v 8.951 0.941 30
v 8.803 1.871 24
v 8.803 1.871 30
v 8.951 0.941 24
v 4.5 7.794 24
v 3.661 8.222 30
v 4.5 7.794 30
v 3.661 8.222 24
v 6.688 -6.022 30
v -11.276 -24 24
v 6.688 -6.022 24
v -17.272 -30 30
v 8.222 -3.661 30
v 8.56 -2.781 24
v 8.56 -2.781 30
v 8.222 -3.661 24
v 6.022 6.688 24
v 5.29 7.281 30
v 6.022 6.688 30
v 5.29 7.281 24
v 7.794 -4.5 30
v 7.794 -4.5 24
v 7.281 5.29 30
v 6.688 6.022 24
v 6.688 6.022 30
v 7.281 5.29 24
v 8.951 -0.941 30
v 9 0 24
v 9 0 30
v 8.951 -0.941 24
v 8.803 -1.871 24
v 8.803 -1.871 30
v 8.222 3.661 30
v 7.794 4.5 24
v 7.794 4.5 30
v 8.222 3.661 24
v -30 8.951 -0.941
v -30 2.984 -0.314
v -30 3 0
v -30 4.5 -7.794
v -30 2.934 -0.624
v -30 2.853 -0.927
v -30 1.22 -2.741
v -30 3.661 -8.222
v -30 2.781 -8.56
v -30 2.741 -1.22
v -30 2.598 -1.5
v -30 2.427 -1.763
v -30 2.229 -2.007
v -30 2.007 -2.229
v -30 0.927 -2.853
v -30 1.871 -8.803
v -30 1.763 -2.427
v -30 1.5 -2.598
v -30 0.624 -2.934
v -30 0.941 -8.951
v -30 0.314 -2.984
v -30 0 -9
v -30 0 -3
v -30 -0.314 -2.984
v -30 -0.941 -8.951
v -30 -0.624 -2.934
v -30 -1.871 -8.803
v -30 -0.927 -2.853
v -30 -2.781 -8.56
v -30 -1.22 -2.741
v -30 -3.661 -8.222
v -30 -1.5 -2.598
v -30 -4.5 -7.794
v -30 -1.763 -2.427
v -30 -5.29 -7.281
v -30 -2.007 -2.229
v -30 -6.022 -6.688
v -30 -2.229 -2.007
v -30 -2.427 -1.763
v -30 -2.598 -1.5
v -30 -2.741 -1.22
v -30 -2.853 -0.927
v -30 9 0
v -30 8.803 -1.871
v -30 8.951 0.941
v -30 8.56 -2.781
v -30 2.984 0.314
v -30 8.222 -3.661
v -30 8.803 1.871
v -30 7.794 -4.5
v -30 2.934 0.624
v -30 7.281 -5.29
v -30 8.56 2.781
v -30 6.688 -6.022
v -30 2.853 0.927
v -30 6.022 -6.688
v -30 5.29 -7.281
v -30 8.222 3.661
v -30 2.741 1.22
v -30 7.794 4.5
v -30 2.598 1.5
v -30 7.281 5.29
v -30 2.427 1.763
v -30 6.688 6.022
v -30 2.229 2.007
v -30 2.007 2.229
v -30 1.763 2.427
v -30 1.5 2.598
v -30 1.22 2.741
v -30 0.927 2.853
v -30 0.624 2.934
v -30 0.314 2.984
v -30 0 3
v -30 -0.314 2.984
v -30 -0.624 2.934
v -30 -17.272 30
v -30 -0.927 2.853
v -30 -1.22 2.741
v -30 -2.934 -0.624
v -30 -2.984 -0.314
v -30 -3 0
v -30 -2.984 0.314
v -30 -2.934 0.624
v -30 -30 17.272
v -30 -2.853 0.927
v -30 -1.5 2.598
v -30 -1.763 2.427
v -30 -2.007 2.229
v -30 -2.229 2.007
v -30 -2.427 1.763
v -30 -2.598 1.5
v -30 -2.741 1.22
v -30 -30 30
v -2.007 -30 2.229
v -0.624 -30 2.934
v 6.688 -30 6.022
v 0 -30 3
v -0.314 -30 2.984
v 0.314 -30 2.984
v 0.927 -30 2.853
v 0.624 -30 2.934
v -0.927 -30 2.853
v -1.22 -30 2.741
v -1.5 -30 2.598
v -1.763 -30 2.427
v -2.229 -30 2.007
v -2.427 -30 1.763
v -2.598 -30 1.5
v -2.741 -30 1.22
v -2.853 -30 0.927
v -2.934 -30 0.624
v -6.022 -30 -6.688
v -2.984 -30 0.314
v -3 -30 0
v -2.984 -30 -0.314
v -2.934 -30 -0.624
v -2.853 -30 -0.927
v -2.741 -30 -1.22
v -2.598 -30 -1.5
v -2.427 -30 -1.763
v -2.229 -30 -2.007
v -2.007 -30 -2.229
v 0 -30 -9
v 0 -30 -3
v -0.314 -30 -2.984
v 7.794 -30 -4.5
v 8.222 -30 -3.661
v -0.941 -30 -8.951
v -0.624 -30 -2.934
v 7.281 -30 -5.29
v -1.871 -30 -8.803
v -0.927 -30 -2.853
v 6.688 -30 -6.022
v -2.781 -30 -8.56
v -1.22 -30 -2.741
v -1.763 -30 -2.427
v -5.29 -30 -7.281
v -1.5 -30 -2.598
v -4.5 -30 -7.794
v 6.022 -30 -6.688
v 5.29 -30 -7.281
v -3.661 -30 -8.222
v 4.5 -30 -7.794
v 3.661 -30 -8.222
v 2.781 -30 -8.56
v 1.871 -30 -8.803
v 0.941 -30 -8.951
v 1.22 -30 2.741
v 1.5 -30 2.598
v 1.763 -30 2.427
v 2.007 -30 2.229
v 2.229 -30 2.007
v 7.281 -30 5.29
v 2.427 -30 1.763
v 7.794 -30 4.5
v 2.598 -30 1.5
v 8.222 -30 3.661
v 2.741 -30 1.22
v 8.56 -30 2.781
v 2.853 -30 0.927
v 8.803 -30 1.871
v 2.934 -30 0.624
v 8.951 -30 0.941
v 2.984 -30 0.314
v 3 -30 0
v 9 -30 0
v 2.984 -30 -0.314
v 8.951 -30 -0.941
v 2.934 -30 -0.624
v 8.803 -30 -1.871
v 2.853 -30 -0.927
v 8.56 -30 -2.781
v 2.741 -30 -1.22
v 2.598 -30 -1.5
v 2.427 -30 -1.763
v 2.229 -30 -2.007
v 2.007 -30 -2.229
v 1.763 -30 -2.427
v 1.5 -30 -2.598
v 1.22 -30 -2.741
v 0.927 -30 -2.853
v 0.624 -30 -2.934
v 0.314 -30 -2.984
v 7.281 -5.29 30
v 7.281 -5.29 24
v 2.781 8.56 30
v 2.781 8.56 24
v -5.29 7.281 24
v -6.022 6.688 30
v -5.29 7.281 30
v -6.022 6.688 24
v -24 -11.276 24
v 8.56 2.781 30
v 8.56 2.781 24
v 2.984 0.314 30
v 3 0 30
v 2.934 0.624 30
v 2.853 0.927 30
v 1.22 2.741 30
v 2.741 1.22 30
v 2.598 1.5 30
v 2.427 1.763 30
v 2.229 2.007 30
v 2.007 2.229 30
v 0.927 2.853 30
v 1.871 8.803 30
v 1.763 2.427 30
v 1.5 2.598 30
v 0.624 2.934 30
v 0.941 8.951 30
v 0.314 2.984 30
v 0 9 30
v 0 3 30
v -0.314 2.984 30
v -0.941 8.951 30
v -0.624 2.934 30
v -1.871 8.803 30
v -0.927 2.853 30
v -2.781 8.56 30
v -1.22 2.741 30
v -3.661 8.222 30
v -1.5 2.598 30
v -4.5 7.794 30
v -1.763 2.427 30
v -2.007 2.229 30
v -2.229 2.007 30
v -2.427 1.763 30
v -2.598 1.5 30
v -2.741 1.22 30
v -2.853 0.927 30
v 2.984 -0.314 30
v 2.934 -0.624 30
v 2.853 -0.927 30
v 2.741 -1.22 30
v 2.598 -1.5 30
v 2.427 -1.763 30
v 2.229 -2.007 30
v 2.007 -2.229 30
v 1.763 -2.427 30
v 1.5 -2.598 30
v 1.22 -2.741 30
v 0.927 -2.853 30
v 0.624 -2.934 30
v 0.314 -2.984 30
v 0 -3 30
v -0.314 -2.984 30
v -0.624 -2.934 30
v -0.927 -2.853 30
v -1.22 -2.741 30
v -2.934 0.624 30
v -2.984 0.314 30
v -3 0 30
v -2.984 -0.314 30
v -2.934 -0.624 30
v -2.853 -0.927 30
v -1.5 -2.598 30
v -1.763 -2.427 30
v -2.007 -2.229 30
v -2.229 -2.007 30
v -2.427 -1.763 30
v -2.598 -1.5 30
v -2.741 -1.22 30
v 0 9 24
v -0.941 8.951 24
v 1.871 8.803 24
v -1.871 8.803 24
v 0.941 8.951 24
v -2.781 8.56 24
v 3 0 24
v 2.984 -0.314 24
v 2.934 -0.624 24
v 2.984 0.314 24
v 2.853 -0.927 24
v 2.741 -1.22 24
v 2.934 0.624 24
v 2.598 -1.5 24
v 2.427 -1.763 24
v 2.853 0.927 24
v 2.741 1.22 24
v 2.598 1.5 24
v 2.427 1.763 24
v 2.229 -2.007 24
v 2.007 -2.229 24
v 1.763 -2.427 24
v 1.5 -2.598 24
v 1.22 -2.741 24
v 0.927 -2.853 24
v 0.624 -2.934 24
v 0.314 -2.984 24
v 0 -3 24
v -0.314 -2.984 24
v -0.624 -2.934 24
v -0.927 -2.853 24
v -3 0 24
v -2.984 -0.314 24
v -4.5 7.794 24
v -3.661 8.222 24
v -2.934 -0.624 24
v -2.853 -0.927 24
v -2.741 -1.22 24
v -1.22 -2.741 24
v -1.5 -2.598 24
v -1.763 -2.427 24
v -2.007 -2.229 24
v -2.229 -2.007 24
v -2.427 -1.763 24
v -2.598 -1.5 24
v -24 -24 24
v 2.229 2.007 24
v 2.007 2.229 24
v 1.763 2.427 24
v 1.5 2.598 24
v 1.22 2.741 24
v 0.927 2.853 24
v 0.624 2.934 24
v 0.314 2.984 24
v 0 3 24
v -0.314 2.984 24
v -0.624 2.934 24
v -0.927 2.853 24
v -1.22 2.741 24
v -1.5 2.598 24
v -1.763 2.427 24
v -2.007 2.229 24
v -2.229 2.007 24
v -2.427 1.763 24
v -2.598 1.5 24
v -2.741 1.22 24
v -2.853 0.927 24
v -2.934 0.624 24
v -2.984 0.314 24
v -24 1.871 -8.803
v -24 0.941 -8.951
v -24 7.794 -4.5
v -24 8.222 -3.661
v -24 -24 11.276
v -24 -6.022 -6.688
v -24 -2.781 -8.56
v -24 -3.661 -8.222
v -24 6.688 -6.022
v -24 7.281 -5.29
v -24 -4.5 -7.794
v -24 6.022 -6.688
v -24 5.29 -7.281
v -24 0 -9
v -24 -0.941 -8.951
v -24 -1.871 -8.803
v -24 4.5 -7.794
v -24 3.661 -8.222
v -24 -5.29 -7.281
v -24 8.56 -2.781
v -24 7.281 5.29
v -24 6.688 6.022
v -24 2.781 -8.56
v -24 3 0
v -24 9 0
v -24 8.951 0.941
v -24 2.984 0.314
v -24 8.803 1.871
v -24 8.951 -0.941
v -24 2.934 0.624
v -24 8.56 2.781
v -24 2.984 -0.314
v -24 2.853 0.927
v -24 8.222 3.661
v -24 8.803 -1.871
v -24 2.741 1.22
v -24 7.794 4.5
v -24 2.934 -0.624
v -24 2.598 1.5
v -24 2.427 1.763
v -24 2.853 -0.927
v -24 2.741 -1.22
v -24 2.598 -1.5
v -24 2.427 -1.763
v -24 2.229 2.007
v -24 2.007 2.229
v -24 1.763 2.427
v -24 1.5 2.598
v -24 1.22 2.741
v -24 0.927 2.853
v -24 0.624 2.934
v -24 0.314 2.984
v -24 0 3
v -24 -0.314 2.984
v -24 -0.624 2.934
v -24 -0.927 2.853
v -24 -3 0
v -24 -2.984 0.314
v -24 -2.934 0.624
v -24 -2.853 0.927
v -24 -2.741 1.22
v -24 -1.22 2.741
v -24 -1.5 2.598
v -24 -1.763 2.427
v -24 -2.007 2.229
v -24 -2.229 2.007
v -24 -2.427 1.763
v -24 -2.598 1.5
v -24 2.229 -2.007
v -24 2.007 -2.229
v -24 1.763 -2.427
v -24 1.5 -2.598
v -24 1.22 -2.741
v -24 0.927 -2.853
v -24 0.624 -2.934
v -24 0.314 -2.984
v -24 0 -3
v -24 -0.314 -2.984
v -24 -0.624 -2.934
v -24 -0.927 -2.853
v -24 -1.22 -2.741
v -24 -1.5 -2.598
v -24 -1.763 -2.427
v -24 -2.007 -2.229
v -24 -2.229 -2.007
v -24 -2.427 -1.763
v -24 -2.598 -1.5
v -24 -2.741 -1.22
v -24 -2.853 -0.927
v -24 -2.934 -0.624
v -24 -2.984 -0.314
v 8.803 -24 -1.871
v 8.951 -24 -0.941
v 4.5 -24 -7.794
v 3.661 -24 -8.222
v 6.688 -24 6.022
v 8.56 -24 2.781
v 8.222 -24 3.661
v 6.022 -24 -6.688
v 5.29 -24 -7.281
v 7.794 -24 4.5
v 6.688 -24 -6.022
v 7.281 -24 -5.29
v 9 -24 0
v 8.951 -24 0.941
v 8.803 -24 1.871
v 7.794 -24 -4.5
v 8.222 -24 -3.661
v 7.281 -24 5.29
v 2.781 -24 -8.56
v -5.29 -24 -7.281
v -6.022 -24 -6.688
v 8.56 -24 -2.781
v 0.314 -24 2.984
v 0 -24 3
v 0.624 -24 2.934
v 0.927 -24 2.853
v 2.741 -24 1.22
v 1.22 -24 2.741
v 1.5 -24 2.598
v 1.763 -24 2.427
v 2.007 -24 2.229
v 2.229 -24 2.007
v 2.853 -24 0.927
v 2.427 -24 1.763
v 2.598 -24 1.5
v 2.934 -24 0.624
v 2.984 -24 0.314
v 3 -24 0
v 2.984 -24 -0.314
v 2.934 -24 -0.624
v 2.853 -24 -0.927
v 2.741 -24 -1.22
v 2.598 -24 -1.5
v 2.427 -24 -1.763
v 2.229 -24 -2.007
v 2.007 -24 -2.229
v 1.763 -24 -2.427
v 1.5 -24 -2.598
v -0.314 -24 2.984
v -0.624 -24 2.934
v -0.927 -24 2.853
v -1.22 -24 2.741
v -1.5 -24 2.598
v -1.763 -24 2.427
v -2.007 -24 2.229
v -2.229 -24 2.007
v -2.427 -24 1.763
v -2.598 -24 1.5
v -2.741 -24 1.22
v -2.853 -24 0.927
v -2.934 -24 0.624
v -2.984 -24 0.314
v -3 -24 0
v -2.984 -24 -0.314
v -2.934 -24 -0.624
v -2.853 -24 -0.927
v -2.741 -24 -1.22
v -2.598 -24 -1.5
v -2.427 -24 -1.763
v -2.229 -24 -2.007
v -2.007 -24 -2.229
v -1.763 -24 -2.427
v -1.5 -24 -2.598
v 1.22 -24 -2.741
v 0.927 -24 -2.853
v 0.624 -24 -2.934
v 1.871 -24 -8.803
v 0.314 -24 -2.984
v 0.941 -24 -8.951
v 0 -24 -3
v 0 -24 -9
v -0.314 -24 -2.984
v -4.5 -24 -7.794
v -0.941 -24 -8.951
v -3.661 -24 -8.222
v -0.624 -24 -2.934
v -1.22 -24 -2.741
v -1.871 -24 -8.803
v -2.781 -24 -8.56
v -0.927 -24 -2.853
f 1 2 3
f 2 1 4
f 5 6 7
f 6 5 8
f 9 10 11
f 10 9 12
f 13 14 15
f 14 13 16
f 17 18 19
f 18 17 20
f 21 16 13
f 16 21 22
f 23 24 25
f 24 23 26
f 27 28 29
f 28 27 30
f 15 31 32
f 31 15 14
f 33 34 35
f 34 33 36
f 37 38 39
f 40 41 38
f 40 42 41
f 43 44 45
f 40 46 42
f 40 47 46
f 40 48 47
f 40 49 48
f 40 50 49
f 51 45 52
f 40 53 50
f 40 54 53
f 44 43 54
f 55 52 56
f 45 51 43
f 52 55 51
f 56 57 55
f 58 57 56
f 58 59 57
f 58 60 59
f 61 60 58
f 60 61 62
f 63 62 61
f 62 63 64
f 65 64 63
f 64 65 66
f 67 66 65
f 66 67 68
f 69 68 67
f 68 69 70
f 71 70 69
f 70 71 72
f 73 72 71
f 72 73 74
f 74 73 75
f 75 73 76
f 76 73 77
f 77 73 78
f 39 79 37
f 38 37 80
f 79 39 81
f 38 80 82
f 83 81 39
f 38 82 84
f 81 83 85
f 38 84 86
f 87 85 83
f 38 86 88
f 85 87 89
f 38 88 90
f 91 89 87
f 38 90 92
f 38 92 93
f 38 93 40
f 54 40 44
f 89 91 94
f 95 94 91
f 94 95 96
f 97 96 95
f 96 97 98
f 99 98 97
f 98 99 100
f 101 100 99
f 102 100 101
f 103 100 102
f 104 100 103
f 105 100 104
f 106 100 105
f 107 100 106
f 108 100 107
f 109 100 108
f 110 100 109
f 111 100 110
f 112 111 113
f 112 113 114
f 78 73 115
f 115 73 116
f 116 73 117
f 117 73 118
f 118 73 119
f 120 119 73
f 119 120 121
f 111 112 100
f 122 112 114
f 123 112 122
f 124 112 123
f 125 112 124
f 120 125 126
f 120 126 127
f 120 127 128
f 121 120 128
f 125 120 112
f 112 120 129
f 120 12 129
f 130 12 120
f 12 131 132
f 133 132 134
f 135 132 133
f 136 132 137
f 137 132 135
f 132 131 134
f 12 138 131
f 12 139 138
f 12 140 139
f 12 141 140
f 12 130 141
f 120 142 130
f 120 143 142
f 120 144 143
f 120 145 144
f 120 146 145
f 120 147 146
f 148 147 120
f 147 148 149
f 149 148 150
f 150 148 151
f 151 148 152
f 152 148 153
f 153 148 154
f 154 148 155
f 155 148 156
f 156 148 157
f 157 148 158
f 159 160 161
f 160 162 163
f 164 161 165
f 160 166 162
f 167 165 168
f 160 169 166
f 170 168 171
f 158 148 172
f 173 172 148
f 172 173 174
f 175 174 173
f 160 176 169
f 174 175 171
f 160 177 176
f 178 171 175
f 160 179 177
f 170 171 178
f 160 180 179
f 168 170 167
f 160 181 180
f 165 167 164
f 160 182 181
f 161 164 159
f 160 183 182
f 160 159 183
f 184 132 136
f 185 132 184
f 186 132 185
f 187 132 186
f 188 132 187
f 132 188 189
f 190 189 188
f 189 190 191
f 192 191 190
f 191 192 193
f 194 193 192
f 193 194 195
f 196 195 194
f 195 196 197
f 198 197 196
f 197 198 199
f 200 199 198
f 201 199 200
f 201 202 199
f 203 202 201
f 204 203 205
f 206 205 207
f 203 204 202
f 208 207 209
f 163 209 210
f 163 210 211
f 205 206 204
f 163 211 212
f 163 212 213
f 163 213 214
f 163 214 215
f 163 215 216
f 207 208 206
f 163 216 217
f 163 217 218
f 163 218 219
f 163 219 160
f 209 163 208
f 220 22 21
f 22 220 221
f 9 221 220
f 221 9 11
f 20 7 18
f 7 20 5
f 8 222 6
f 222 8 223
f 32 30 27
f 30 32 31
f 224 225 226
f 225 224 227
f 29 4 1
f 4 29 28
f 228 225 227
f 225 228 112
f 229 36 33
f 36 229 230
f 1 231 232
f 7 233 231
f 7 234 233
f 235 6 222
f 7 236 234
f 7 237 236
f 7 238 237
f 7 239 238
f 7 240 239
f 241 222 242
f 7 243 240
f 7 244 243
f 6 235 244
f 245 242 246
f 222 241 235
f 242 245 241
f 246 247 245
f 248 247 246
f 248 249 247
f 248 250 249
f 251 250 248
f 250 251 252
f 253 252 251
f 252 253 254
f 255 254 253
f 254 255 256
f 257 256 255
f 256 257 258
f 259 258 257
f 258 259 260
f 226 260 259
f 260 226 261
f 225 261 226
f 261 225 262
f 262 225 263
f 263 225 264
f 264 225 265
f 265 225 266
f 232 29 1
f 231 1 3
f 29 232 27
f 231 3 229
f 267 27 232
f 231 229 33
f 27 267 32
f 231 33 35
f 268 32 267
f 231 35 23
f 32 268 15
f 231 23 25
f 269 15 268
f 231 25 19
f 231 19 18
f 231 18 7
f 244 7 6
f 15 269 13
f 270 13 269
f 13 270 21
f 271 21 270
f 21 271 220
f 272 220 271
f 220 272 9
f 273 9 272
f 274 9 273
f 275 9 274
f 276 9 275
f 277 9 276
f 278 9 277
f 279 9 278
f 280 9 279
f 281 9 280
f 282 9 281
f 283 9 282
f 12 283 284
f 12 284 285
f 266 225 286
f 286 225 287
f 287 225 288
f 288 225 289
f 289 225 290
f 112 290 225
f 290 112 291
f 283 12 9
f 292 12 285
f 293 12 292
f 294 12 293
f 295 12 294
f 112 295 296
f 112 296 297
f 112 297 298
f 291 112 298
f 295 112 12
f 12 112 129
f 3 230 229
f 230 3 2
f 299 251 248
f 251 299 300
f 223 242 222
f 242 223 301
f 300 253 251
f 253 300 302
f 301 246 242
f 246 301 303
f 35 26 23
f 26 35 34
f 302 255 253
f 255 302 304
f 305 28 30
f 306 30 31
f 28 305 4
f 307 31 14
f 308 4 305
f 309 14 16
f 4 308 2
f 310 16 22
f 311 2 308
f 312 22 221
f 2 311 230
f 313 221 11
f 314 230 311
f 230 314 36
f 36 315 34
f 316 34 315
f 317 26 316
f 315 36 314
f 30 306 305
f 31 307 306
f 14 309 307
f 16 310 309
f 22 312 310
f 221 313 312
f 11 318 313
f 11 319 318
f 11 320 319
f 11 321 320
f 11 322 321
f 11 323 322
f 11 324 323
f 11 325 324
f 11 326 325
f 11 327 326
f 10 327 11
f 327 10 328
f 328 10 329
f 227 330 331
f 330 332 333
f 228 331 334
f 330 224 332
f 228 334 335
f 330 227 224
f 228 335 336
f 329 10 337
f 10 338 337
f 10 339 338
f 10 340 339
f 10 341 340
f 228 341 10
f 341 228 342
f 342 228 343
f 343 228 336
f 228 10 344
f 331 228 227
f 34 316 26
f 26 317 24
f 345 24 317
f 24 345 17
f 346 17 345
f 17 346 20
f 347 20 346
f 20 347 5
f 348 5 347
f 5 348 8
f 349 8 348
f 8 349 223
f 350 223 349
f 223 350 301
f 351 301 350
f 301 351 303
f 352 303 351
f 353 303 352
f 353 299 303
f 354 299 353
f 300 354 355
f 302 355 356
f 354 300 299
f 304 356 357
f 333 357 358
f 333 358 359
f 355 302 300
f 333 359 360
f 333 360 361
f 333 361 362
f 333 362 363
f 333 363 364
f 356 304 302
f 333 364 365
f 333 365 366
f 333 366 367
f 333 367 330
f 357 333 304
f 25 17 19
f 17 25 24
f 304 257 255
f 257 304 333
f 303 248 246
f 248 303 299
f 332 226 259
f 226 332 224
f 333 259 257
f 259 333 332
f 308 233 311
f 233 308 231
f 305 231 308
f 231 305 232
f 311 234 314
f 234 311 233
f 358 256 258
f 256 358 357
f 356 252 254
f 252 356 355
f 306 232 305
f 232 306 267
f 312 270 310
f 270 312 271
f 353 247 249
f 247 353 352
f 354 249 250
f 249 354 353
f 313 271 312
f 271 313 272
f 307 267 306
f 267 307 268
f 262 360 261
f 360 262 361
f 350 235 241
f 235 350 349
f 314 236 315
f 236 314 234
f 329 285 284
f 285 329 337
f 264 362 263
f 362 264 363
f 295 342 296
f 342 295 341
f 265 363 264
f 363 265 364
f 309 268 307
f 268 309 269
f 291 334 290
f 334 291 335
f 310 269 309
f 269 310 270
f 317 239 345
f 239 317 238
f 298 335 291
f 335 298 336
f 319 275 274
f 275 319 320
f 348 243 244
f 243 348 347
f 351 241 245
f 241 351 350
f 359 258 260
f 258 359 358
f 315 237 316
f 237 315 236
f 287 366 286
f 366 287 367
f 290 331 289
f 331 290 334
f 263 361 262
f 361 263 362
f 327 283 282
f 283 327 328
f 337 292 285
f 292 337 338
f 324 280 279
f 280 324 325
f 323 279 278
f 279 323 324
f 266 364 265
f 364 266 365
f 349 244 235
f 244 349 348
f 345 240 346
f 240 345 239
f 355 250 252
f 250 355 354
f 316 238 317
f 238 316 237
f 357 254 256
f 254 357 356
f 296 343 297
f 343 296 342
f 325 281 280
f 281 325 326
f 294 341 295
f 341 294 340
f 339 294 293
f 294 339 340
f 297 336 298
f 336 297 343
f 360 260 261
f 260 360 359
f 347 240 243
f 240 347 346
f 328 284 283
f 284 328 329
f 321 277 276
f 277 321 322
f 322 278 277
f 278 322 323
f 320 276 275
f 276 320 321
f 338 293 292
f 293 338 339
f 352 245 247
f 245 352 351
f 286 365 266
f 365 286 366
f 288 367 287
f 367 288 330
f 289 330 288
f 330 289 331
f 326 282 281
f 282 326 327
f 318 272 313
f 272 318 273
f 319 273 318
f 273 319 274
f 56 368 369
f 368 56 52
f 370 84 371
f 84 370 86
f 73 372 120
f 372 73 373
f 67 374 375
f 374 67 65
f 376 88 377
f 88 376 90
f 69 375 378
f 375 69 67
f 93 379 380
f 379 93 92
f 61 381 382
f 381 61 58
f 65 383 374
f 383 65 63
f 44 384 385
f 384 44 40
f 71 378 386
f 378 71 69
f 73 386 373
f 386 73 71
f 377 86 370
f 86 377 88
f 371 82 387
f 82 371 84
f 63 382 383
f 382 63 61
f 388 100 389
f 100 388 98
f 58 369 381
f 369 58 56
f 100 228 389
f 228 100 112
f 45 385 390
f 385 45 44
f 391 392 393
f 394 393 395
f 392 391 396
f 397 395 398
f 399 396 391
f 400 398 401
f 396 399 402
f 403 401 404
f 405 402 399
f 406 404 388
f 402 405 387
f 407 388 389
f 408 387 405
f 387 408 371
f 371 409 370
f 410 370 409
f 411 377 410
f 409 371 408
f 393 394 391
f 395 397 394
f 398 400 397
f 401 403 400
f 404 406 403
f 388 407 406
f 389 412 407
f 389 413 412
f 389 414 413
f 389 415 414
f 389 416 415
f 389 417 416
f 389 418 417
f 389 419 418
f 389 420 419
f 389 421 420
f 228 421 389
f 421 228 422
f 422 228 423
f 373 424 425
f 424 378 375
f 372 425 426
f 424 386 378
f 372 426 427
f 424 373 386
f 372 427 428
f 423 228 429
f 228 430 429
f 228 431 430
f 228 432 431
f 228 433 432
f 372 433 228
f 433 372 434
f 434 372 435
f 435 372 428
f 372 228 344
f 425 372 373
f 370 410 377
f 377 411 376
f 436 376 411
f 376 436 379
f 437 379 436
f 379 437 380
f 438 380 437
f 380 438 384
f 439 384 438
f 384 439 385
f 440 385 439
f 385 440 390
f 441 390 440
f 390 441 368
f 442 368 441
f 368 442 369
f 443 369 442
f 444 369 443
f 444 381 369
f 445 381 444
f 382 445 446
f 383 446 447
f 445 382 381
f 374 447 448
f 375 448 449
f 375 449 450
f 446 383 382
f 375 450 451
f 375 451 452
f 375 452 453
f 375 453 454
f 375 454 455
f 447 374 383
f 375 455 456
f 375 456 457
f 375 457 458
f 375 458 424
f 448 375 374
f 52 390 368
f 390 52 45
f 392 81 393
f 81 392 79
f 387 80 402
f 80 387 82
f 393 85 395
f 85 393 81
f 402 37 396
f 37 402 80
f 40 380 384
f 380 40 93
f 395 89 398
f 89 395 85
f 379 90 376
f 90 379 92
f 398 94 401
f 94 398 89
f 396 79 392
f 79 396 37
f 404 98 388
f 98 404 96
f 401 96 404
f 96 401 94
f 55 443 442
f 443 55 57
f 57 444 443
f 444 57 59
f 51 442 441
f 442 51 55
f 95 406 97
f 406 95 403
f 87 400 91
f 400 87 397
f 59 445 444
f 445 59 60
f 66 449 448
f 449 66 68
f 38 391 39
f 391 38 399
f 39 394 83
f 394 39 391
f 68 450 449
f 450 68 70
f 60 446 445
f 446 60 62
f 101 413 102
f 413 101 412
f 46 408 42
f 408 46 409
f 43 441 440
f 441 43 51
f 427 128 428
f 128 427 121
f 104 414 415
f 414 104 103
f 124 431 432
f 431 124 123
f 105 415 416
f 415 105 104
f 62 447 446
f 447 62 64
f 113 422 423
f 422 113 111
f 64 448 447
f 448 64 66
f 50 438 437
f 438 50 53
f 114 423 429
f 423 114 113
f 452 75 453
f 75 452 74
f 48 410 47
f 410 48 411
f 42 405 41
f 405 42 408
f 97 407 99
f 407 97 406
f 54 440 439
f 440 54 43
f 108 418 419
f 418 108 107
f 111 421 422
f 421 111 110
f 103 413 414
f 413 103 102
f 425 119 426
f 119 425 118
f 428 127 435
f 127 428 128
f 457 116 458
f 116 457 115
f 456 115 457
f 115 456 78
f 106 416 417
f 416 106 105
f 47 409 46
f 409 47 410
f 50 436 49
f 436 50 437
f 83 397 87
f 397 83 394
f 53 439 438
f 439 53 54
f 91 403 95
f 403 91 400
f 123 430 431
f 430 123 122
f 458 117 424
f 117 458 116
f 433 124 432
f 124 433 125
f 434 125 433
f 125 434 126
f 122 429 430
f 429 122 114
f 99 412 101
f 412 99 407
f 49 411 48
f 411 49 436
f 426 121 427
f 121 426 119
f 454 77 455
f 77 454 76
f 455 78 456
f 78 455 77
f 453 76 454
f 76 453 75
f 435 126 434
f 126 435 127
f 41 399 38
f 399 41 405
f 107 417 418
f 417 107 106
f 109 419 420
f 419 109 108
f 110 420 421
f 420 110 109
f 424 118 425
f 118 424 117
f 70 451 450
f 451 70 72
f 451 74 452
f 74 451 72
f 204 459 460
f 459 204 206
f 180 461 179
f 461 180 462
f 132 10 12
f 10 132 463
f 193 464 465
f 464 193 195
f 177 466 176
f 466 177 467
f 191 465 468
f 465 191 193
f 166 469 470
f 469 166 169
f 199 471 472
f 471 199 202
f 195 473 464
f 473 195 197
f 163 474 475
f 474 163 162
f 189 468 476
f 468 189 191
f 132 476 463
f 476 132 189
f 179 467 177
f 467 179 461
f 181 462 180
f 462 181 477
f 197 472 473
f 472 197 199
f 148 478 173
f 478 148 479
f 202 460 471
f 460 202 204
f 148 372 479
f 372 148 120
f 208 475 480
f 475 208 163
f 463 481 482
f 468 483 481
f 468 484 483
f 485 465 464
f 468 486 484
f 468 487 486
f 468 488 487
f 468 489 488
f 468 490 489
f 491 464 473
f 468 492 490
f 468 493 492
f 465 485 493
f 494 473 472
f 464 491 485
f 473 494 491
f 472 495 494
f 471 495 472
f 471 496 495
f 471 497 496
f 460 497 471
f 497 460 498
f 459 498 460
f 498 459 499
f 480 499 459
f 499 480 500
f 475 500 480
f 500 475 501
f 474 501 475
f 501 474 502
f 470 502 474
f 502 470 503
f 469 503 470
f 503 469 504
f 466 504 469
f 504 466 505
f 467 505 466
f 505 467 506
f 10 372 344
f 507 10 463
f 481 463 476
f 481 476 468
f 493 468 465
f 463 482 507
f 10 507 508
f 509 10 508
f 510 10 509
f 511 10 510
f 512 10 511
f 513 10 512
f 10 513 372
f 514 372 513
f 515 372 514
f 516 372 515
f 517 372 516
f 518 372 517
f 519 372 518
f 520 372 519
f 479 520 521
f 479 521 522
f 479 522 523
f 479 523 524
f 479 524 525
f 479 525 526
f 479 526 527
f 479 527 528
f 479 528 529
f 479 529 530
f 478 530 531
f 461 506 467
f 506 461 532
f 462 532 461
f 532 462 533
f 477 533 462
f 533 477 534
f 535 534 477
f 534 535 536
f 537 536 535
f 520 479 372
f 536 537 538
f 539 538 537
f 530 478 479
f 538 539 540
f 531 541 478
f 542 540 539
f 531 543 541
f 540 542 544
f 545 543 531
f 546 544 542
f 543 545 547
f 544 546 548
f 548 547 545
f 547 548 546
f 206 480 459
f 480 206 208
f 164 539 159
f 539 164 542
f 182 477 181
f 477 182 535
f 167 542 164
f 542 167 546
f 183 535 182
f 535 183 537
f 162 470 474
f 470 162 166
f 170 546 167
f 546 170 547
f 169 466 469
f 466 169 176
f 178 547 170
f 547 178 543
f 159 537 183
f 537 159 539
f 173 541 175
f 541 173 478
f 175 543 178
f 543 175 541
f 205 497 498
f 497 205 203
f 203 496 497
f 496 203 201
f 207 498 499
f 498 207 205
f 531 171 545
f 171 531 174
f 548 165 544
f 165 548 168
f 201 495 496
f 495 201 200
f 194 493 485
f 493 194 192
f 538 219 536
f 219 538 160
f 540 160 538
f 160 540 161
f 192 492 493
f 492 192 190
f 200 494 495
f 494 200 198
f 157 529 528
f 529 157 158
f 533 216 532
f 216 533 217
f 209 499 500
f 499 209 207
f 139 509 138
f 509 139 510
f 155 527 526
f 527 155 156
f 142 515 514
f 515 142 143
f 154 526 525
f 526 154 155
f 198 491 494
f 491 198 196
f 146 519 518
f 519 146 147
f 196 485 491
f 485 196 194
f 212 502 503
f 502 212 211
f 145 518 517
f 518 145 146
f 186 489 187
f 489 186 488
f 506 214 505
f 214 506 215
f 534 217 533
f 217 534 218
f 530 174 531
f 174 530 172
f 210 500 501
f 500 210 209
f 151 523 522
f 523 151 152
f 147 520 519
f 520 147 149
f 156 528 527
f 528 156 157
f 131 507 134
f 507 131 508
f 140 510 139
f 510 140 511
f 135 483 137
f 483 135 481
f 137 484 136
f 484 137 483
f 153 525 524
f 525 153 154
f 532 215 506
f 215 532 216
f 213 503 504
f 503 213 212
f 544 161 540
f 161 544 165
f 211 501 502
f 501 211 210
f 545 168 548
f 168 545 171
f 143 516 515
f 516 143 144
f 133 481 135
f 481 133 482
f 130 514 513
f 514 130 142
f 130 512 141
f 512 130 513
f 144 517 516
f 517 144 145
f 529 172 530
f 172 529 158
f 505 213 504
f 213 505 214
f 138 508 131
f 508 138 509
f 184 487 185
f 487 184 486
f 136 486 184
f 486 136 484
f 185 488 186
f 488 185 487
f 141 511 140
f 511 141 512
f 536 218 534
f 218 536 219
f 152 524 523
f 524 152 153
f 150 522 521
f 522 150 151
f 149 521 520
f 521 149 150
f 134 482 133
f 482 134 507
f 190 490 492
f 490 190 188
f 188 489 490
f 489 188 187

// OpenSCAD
$fn=60;
radius_tr = 6/2;
sl = 300;
sxl =  500;
wt = 3.2;


module yafc(ang=0) 
{
    r = radius_tr;
    hyp = sqrt(r*3*r*3*2);
    rotate([ang,0,0]) difference() 
    {
        hull() 
        {
            translate([r*9, r*9, 0])  cylinder(h=r*2, r=r*3, center=true);
            translate([hyp/2-r, hyp/2-r, 0])  cube([hyp, hyp, r*2], center=true);
        }
#    translate([r*9, r*9, 0])  cylinder(h=r*8, r=r, center=true);

    }
}

module connector() 
{
    translate([-radius_tr*9, -radius_tr*9, radius_tr*9]) 
    {
        rotate([0,0,0])  yafc() ;
        rotate([0,90,0])  yafc() ;
        rotate([-90,0,0]) yafc() ;
    }
}



module connector_center() 
{
    translate([-radius_tr*9, -radius_tr*9, radius_tr*9]) 
    {
        rotate([0,0,0])  yafc() ;
        rotate([0,90,0])  yafc() ;
        translate([0, 0, -radius_tr]) rotate([-90,0,0]) yafc(ang=-45) ;
    }
}

connector();

//connector_center();
